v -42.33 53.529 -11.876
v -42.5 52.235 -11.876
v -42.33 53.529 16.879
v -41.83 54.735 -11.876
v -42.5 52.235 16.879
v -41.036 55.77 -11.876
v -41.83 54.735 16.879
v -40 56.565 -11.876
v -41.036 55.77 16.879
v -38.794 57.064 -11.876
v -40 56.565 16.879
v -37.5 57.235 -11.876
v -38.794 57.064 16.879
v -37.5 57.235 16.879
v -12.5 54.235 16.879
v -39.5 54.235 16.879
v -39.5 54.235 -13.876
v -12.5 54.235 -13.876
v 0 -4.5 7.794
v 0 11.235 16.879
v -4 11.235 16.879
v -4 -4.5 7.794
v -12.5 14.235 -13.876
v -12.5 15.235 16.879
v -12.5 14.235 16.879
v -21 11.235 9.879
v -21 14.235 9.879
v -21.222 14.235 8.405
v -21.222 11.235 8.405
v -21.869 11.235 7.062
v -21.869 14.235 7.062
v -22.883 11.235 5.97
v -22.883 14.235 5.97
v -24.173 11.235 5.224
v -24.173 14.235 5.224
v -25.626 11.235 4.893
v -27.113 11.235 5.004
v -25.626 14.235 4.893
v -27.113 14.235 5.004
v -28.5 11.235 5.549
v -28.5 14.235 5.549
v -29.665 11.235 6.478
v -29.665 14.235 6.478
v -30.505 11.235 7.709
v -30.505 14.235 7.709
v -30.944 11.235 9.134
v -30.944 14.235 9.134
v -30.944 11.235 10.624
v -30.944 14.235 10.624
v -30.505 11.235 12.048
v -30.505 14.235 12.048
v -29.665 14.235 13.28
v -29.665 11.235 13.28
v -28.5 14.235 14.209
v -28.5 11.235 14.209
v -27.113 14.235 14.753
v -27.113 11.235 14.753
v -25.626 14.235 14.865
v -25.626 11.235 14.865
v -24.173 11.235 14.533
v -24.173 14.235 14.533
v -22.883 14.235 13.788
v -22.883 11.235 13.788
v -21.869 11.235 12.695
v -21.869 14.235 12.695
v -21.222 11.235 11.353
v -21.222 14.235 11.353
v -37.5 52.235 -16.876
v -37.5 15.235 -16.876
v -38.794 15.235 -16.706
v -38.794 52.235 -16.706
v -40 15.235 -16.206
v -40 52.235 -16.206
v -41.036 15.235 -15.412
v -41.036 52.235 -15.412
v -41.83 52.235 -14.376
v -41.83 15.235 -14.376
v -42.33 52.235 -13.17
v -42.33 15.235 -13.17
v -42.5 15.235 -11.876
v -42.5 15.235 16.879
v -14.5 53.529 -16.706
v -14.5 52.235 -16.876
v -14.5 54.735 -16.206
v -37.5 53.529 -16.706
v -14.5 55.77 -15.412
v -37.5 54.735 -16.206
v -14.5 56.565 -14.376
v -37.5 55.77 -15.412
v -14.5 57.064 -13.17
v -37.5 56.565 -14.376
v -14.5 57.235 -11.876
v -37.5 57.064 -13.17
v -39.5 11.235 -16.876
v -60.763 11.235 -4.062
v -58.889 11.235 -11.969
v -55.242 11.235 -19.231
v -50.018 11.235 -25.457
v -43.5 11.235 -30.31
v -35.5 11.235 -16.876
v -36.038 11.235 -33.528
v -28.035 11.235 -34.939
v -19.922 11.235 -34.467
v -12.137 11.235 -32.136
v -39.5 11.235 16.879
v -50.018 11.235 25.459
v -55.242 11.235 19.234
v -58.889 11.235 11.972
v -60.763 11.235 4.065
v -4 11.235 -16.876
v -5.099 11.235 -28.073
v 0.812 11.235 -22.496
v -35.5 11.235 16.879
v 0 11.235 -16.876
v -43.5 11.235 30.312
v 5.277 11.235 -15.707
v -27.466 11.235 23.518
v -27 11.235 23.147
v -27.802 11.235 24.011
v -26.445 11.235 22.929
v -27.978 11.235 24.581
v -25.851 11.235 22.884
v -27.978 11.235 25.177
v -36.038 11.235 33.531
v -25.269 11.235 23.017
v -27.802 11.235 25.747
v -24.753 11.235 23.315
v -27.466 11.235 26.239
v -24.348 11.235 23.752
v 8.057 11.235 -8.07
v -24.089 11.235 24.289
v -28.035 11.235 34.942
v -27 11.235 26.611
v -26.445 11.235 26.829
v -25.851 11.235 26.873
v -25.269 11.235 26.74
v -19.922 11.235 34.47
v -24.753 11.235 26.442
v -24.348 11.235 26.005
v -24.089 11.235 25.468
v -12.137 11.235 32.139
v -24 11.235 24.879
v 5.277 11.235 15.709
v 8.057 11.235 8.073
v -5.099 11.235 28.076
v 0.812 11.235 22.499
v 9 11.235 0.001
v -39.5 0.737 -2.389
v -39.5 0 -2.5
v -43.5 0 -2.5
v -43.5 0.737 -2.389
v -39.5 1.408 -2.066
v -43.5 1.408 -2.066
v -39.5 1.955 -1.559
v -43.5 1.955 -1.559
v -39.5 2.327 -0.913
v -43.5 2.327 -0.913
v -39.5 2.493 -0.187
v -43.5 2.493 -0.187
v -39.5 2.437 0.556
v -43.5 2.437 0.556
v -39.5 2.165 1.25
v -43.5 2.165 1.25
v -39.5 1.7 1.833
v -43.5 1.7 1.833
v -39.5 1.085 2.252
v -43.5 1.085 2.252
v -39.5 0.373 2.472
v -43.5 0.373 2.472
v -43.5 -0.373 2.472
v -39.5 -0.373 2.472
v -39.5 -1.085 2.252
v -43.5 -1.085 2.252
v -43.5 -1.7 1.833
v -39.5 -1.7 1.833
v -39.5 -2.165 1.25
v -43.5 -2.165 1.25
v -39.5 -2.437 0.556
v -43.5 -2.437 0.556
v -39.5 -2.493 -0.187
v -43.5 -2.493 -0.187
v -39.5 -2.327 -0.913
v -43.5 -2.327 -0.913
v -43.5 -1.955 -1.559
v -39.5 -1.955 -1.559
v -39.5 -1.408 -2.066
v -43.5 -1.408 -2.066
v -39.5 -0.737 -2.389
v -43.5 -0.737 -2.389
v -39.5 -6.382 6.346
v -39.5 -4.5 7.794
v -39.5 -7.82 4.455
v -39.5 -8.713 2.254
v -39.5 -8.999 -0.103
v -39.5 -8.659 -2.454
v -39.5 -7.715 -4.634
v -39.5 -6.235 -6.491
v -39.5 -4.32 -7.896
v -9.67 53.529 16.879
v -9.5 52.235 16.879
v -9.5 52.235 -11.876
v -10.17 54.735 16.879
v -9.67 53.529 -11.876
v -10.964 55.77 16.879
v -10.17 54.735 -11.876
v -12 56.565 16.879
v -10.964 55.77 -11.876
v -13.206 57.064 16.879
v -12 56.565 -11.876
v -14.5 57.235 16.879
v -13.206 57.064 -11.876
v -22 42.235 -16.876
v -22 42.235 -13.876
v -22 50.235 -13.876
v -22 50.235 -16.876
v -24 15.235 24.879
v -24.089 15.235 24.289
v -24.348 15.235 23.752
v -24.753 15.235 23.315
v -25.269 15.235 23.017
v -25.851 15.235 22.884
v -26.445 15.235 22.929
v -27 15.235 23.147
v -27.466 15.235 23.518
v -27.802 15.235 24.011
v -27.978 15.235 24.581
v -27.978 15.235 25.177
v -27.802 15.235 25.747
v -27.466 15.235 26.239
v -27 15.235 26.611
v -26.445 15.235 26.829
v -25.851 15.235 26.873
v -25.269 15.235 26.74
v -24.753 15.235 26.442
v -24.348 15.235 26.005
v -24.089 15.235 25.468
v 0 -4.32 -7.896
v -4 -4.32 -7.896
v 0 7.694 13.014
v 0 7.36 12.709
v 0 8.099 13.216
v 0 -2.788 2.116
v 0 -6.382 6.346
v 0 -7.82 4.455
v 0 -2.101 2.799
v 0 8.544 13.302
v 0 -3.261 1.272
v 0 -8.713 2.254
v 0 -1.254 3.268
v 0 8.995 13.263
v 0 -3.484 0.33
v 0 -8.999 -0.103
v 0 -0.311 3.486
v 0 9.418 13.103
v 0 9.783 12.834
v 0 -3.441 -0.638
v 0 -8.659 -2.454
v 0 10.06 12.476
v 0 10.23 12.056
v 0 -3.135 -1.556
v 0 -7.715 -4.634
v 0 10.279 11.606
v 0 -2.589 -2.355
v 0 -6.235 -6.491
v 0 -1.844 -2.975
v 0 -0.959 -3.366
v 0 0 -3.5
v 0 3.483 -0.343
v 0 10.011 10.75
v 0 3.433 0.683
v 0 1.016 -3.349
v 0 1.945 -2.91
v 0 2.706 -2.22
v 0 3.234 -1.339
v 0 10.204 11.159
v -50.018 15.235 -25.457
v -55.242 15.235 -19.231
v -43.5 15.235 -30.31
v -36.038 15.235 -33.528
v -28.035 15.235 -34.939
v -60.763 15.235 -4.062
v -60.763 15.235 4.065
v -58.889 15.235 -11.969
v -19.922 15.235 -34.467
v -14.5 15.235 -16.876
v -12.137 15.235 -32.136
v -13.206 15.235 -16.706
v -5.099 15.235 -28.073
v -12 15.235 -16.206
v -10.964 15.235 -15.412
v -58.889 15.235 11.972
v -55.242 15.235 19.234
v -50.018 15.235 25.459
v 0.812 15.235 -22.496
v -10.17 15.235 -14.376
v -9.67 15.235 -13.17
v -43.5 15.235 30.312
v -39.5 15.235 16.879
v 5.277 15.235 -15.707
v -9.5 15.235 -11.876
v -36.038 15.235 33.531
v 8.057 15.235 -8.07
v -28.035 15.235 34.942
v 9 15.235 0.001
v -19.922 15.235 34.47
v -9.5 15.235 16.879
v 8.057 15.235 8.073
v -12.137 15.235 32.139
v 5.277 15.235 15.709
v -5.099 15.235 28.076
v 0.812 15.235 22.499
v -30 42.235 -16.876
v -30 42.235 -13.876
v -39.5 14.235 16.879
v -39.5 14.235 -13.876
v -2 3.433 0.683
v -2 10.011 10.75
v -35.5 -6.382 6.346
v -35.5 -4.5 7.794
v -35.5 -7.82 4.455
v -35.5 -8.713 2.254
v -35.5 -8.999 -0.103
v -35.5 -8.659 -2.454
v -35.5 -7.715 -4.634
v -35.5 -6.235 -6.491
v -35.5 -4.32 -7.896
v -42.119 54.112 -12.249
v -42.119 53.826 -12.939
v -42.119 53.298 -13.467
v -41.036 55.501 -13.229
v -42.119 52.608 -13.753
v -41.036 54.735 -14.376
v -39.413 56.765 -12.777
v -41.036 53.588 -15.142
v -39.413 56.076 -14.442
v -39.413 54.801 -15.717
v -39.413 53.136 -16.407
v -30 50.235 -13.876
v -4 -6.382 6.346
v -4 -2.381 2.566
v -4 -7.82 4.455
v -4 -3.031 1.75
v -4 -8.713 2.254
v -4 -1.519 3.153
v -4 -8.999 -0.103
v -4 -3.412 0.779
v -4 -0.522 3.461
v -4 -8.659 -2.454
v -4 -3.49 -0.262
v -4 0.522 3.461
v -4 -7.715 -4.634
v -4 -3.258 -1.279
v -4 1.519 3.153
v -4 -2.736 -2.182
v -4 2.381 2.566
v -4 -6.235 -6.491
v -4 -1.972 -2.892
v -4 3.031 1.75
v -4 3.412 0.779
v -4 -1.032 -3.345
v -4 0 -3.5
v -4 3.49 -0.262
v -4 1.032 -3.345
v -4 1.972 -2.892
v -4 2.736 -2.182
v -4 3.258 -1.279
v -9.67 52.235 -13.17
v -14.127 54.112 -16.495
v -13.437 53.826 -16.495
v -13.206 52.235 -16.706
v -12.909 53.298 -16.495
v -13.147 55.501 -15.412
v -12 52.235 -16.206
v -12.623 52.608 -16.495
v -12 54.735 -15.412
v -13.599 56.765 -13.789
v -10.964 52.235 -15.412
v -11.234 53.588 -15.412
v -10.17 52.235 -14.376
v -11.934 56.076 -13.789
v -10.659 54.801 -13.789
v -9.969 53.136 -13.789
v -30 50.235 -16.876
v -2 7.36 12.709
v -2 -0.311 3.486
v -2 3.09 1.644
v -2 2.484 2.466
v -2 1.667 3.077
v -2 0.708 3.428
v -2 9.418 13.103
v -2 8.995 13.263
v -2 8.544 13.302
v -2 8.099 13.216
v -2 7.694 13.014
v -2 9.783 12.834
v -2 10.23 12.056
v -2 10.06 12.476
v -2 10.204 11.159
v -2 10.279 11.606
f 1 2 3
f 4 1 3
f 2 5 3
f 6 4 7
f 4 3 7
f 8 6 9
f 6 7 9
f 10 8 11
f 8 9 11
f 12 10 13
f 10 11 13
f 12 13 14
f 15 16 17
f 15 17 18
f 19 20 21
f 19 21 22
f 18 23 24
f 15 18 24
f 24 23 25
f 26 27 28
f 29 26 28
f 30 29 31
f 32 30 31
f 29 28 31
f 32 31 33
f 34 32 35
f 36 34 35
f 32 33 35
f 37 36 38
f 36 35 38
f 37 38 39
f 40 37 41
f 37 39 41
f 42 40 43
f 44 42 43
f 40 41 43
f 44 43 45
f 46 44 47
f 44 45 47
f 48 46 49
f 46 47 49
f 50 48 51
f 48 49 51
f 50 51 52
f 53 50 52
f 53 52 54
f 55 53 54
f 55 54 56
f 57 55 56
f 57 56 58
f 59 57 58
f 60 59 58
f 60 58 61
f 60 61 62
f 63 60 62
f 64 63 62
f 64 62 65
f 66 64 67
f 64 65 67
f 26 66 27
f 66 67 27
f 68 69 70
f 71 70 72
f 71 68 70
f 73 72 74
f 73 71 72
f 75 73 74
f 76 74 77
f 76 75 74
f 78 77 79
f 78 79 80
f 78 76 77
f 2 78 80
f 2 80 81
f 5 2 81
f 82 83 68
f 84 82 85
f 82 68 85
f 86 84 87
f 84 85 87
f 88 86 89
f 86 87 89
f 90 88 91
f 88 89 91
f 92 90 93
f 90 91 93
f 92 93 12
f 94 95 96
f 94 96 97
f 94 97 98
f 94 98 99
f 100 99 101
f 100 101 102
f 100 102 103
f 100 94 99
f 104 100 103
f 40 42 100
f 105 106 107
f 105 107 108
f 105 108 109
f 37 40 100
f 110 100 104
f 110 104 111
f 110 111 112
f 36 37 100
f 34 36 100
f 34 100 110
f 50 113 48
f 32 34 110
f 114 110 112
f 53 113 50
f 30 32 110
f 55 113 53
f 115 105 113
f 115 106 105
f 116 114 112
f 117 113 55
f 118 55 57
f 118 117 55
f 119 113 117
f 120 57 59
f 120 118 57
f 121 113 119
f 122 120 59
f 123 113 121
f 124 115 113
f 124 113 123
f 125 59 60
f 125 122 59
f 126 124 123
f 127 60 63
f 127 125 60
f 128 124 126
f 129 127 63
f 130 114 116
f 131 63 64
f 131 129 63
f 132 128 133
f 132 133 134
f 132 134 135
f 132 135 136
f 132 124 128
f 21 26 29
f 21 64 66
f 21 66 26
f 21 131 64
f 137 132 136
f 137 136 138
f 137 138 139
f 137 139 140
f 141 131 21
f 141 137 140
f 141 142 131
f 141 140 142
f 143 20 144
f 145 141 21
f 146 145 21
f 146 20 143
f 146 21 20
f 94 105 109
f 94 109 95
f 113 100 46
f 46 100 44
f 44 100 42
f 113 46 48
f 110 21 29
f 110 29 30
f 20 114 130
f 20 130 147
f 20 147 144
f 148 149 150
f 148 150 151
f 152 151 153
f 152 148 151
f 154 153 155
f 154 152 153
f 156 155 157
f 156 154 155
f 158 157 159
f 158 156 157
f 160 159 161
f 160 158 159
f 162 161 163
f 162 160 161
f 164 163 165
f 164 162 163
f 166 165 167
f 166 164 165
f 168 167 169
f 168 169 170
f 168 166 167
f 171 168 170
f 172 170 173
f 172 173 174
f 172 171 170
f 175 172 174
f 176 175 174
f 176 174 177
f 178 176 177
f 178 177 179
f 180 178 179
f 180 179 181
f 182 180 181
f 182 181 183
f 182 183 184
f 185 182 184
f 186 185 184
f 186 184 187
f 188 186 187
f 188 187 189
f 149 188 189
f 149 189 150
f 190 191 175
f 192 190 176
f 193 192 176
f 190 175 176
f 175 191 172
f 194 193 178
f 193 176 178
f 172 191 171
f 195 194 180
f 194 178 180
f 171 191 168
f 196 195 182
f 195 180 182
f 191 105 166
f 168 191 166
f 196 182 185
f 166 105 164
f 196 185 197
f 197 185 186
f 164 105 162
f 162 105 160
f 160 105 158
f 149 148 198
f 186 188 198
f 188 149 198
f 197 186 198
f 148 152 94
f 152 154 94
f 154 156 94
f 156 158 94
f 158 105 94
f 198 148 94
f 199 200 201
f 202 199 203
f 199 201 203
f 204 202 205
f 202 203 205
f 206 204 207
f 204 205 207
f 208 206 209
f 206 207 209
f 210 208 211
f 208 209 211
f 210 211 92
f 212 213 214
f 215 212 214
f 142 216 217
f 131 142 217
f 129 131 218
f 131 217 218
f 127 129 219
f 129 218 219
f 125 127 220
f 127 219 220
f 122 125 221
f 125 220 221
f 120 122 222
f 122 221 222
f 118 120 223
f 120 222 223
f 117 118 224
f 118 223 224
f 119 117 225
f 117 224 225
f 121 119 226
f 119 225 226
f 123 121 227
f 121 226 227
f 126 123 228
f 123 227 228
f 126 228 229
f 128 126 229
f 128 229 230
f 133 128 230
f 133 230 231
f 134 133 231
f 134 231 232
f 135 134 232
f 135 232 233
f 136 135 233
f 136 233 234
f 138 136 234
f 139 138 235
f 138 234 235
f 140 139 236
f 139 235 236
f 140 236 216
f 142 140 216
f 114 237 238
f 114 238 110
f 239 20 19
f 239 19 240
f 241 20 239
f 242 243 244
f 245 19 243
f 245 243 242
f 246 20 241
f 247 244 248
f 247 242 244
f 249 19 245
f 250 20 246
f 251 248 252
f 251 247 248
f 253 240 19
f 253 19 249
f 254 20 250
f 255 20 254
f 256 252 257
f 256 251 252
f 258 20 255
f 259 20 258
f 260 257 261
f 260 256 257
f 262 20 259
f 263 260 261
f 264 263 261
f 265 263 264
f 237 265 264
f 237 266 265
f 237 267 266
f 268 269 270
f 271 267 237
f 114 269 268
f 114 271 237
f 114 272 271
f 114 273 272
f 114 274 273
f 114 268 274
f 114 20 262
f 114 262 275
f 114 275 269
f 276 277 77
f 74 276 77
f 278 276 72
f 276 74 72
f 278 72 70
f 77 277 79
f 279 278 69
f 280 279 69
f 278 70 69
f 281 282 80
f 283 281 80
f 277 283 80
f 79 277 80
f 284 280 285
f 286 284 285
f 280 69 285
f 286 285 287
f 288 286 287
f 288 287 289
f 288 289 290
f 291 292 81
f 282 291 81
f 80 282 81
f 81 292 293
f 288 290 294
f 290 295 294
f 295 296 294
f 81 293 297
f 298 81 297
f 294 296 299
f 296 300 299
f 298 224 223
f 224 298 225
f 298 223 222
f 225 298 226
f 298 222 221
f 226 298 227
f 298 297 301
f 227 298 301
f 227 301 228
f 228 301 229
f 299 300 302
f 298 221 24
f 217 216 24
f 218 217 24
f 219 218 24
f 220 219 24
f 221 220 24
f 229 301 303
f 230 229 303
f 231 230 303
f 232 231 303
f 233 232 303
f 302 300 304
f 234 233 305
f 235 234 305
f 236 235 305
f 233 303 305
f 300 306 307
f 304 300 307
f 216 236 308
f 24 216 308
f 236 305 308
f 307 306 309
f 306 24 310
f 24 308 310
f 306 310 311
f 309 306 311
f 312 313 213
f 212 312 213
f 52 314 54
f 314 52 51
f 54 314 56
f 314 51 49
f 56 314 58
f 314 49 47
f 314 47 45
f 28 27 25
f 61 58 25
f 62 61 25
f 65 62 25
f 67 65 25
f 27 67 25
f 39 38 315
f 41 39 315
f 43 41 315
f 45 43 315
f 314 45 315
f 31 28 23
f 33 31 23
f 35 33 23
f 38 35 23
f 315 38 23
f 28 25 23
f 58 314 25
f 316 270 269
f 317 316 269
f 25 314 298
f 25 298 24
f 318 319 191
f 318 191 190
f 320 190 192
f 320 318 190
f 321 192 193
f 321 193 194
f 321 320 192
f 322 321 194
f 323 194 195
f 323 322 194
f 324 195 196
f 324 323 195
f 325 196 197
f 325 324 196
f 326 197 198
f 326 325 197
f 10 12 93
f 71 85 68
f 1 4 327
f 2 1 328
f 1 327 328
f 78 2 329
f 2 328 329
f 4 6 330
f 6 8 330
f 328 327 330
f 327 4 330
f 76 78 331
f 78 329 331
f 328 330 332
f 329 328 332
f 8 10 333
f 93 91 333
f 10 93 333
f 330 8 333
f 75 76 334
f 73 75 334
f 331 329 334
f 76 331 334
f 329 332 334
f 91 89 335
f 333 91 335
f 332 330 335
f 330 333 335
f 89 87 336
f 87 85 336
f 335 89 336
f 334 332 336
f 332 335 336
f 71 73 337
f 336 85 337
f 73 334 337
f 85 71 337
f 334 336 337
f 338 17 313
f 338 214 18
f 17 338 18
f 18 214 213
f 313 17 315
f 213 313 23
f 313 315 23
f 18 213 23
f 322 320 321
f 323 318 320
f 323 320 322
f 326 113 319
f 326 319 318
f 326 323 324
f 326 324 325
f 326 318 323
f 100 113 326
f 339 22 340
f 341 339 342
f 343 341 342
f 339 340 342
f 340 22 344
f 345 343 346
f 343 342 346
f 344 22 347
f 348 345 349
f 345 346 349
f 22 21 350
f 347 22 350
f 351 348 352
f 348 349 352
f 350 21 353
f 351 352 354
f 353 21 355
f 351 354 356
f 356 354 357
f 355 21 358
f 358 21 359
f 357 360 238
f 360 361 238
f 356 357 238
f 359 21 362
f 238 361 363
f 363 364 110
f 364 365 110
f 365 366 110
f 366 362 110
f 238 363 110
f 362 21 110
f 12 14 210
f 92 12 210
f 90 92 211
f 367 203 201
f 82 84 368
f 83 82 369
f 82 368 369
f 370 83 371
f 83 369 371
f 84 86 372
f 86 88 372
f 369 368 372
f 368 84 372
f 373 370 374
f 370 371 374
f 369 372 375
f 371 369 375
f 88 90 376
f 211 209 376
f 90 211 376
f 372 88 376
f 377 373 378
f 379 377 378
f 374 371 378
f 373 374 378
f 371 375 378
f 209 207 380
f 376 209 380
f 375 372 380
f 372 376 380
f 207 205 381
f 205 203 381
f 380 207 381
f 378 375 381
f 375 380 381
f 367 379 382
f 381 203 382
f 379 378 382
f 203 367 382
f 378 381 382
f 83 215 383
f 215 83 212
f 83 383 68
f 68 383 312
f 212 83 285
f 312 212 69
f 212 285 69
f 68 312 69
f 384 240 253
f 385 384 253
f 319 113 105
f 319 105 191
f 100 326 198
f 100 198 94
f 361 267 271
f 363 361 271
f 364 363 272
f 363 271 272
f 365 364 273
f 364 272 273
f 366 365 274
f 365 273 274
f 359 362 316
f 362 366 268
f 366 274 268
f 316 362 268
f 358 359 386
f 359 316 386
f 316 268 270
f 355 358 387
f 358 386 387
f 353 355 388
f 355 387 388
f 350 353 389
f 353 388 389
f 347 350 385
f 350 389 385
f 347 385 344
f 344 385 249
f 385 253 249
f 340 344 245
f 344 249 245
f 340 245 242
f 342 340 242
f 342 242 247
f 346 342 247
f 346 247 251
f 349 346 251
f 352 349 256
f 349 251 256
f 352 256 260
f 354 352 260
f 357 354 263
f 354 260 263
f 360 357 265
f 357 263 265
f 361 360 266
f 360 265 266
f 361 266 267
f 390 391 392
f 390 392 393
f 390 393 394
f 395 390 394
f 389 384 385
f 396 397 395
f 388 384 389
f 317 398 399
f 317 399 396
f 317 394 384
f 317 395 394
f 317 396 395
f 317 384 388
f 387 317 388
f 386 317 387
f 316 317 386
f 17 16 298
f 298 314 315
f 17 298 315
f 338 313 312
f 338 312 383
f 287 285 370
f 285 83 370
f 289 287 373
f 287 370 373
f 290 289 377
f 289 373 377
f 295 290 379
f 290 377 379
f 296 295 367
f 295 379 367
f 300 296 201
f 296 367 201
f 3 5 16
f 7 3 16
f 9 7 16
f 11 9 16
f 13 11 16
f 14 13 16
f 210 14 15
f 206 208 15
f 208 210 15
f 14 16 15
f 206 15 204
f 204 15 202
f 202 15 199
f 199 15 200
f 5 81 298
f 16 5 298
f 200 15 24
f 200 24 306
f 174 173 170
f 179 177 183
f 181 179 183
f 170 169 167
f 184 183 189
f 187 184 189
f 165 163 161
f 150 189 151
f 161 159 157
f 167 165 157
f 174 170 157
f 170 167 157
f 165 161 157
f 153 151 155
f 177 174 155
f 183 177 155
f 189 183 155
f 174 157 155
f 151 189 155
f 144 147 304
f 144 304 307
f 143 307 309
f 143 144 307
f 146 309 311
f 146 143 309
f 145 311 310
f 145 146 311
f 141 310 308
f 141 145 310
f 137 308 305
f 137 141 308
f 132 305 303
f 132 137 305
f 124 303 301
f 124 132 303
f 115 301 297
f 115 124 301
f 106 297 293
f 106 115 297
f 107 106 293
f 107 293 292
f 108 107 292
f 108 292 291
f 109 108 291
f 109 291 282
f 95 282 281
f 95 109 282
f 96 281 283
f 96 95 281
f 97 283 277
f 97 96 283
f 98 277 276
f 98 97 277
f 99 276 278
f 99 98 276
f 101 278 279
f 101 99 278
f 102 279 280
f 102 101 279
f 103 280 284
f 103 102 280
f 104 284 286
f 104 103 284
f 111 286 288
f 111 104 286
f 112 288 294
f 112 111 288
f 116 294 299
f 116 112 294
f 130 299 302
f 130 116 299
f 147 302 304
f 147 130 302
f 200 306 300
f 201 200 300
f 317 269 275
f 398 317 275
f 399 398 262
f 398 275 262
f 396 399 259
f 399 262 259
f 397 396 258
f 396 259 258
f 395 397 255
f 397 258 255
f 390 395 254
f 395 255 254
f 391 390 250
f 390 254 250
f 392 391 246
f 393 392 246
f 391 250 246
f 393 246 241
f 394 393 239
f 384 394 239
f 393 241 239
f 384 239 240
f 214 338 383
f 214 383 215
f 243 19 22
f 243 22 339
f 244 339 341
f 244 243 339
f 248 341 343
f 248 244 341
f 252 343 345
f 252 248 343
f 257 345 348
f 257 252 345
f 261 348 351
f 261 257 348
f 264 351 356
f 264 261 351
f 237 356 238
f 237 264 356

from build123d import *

# Parameters (mm, degrees)
SKETCH_1_R          = 9
SKETCH_1_R_2        = 2.5
EXTRUDE_1_DEPTH     = 4
EXTRUDE_2_DEPTH     = 4
SKETCH_6_W          = 33.754755736
SKETCH_6_H          = 3
EXTRUDE_5_DEPTH     = 52
SKETCH_7_R          = 2.5
EXTRUDE_6_DEPTH     = 4
SKETCH_8_R          = 2.5
EXTRUDE_7_DEPTH     = 8
SKETCH_9_W          = 27
SKETCH_9_H          = 3
EXTRUDE_8_DEPTH     = 40
SKETCH_10_W         = 8
SKETCH_10_H         = 8
CUT_EXTRUDE_1_DEPTH = 40
SKETCH_11_W         = 27
SKETCH_11_H         = 30.754755736
EXTRUDE_9_DEPTH     = 3
SKETCH_12_R         = 35
SKETCH_12_W         = 33
SKETCH_12_H         = 33.754755736
EXTRUDE_10_DEPTH    = 4
SKETCH_13_R         = 2
CUT_EXTRUDE_2_DEPTH = 4
FILLET_1_R          = 5
SKETCH_14_R         = 5
CUT_EXTRUDE_3_DEPTH = 3
CUT_EXTRUDE_4_DEPTH = 2
SKETCH_16_R         = 3.5
CUT_EXTRUDE_5_DEPTH = 6


with BuildPart() as part:
    # 草图1 → 凸台-拉伸1 (new body)
    with BuildSketch(Plane(origin=(0, 0, 0), x_dir=(0, 0, -1), z_dir=(1, 0, 0))):
        Circle(SKETCH_1_R)
        Circle(SKETCH_1_R_2, mode=Mode.SUBTRACT)
    extrude(amount=-EXTRUDE_1_DEPTH)

    # 草图2 → 凸台-拉伸2 (add)
    with BuildSketch(Plane(origin=(0, 0, 0), x_dir=(0, 0, -1), z_dir=(1, 0, 0))):
        with BuildLine():
            Line((-16.878750928, 11.234854176), (-7.794228634, -4.5))
            ThreePointArc((-7.794228634, -4.5), (-2.329371406, 8.693332437), (9, 0))
            ThreePointArc((9, 0), (8.719533008, -2.229292291), (7.895612418, -4.319641714))
            Line((7.895612418, -4.319641714), (16.876004808, 11.234854176))
            Line((16.876004808, 11.234854176), (-16.878750928, 11.234854176))
        make_face()
    extrude(amount=-EXTRUDE_2_DEPTH)

    # 草图6 → 凸台-拉伸5 (add)
    with BuildSketch(Plane(origin=(0, 0, 0), x_dir=(0, 0, -1), z_dir=(1, 0, 0))):
        with Locations((-0.00137306, 12.734854176)):
            Rectangle(SKETCH_6_W, SKETCH_6_H)
    extrude(amount=-EXTRUDE_5_DEPTH)

    # 草图7 → 凸台-拉伸6 (add)
    with BuildSketch(Plane(origin=(-35.5, 0, 0), x_dir=(0, 0, -1), z_dir=(1, 0, 0))):
        with BuildLine():
            Line((-16.878750928, 11.234854176), (-7.794228634, -4.5))
            ThreePointArc((-7.794228634, -4.5), (0.103450209, -8.999405428), (7.895612418, -4.319641714))
            Line((7.895612418, -4.319641714), (16.876004808, 11.234854176))
            Line((16.876004808, 11.234854176), (-16.878750928, 11.234854176))
        make_face()
        Circle(SKETCH_7_R, mode=Mode.SUBTRACT)
    extrude(amount=-EXTRUDE_6_DEPTH)

    # 草图8 → 凸台-拉伸7 (add)
    with BuildSketch(Plane(origin=(-35.5, 0, 0), x_dir=(0, 0, -1), z_dir=(1, 0, 0))):
        Circle(SKETCH_8_R)
    extrude(amount=-EXTRUDE_7_DEPTH)

    # 草图9 → 凸台-拉伸8 (add)
    with BuildSketch(Plane(origin=(0, 14.234854176, 0), x_dir=(1, 0, 0), z_dir=(0, 1, 0))):
        Polygon((-12.5, 16.876004808), (-12.5, 13.876004808), (-12.5, -16.878750928), (-9.5, -16.878750928), (-9.5, 16.876004808), align=None)
        Polygon((-39.5, -16.878750928), (-39.5, 13.876004808), (-39.5, 16.876004808), (-42.5, 16.876004808), (-42.5, -16.878750928), align=None)
        with Locations((-26, 15.376004808)):
            Rectangle(SKETCH_9_W, SKETCH_9_H)
    extrude(amount=EXTRUDE_8_DEPTH)

    # 草图10 → 切除-拉伸1 (cut)
    with BuildSketch(Plane.XY.offset(-13.876004808)):
        with Locations((-26, 46.234854176)):
            Rectangle(SKETCH_10_W, SKETCH_10_H)
    extrude(amount=-CUT_EXTRUDE_1_DEPTH, mode=Mode.SUBTRACT)

    # 草图11 → 凸台-拉伸9 (add)
    with BuildSketch(Plane(origin=(0, 54.234854176, 0), x_dir=(1, 0, 0), z_dir=(0, 1, 0))):
        Polygon((-9.5, -16.878750928), (-9.5, 16.876004808), (-42.5, 16.876004808), (-42.5, -16.878750928), (-39.5, -16.878750928), (-39.5, 13.876004808), (-12.5, 13.876004808), (-12.5, -16.878750928), align=None)
        with Locations((-26, -1.50137306)):
            Rectangle(SKETCH_11_W, SKETCH_11_H)
    extrude(amount=EXTRUDE_9_DEPTH)

    # 草图12 → 凸台-拉伸10 (add)
    with BuildSketch(Plane.XZ.offset(-11.234854176)):
        with Locations((-26, 0.00137306)):
            Circle(SKETCH_12_R)
        with Locations((-26, 0.00137306)):
            Rectangle(SKETCH_12_W, SKETCH_12_H, mode=Mode.SUBTRACT)
    extrude(amount=-EXTRUDE_10_DEPTH)

    # 草图13 → 切除-拉伸2 (cut)
    with BuildSketch(Plane(origin=(0, 15.234854176, 0), x_dir=(1, 0, 0), z_dir=(0, 1, 0))):
        with Locations((-26, -24.878750928)):
            Circle(SKETCH_13_R)
    extrude(amount=-CUT_EXTRUDE_2_DEPTH, mode=Mode.SUBTRACT)

    # 圆角1
    fillet_1_edges = [part.edges().sort_by_distance(p)[0] for p in [
        (-9.5, 57.234854176, 0.00137306),
        (-26, 57.234854176, -16.876004808),
        (-42.5, 57.234854176, 0.00137306),
        (-9.5, 36.234854176, -16.876004808),
        (-42.5, 36.234854176, -16.876004808),
    ]]
    fillet(fillet_1_edges, radius=FILLET_1_R)

    # 草图14 → 切除-拉伸3 (cut)
    with BuildSketch(Plane(origin=(0, 14.234854176, 0), x_dir=(1, 0, 0), z_dir=(0, 1, 0))):
        with Locations((-26, -9.878750928)):
            Circle(SKETCH_14_R)
    extrude(amount=-CUT_EXTRUDE_3_DEPTH, mode=Mode.SUBTRACT)

    # 草图15 → 切除-拉伸4 (cut)
    with BuildSketch(Plane(origin=(0, 0, 0), x_dir=(0, 0, -1), z_dir=(1, 0, 0))):
        with BuildLine():
            ThreePointArc((-3.486194042, -0.310565776), (-2.801542224, 2.097942126), (-0.683036299, 3.432704679))
            Line((-0.683036299, 3.432704679), (-10.750051286, 10.010751226))
            ThreePointArc((-10.750051286, 10.010751226), (-12.980710136, 9.609748083), (-12.708559077, 7.359731144))
            Line((-12.708559077, 7.359731144), (-3.486194042, -0.310565776))
        make_face()
    extrude(amount=-CUT_EXTRUDE_4_DEPTH, mode=Mode.SUBTRACT)

    # 草图16 → 切除-拉伸5 (cut)
    with BuildSketch(Plane(origin=(0, 0, 0), x_dir=(0, 0, -1), z_dir=(1, 0, 0))):
        Circle(SKETCH_16_R)
    extrude(amount=-CUT_EXTRUDE_5_DEPTH, mode=Mode.SUBTRACT)


solid = part.part
